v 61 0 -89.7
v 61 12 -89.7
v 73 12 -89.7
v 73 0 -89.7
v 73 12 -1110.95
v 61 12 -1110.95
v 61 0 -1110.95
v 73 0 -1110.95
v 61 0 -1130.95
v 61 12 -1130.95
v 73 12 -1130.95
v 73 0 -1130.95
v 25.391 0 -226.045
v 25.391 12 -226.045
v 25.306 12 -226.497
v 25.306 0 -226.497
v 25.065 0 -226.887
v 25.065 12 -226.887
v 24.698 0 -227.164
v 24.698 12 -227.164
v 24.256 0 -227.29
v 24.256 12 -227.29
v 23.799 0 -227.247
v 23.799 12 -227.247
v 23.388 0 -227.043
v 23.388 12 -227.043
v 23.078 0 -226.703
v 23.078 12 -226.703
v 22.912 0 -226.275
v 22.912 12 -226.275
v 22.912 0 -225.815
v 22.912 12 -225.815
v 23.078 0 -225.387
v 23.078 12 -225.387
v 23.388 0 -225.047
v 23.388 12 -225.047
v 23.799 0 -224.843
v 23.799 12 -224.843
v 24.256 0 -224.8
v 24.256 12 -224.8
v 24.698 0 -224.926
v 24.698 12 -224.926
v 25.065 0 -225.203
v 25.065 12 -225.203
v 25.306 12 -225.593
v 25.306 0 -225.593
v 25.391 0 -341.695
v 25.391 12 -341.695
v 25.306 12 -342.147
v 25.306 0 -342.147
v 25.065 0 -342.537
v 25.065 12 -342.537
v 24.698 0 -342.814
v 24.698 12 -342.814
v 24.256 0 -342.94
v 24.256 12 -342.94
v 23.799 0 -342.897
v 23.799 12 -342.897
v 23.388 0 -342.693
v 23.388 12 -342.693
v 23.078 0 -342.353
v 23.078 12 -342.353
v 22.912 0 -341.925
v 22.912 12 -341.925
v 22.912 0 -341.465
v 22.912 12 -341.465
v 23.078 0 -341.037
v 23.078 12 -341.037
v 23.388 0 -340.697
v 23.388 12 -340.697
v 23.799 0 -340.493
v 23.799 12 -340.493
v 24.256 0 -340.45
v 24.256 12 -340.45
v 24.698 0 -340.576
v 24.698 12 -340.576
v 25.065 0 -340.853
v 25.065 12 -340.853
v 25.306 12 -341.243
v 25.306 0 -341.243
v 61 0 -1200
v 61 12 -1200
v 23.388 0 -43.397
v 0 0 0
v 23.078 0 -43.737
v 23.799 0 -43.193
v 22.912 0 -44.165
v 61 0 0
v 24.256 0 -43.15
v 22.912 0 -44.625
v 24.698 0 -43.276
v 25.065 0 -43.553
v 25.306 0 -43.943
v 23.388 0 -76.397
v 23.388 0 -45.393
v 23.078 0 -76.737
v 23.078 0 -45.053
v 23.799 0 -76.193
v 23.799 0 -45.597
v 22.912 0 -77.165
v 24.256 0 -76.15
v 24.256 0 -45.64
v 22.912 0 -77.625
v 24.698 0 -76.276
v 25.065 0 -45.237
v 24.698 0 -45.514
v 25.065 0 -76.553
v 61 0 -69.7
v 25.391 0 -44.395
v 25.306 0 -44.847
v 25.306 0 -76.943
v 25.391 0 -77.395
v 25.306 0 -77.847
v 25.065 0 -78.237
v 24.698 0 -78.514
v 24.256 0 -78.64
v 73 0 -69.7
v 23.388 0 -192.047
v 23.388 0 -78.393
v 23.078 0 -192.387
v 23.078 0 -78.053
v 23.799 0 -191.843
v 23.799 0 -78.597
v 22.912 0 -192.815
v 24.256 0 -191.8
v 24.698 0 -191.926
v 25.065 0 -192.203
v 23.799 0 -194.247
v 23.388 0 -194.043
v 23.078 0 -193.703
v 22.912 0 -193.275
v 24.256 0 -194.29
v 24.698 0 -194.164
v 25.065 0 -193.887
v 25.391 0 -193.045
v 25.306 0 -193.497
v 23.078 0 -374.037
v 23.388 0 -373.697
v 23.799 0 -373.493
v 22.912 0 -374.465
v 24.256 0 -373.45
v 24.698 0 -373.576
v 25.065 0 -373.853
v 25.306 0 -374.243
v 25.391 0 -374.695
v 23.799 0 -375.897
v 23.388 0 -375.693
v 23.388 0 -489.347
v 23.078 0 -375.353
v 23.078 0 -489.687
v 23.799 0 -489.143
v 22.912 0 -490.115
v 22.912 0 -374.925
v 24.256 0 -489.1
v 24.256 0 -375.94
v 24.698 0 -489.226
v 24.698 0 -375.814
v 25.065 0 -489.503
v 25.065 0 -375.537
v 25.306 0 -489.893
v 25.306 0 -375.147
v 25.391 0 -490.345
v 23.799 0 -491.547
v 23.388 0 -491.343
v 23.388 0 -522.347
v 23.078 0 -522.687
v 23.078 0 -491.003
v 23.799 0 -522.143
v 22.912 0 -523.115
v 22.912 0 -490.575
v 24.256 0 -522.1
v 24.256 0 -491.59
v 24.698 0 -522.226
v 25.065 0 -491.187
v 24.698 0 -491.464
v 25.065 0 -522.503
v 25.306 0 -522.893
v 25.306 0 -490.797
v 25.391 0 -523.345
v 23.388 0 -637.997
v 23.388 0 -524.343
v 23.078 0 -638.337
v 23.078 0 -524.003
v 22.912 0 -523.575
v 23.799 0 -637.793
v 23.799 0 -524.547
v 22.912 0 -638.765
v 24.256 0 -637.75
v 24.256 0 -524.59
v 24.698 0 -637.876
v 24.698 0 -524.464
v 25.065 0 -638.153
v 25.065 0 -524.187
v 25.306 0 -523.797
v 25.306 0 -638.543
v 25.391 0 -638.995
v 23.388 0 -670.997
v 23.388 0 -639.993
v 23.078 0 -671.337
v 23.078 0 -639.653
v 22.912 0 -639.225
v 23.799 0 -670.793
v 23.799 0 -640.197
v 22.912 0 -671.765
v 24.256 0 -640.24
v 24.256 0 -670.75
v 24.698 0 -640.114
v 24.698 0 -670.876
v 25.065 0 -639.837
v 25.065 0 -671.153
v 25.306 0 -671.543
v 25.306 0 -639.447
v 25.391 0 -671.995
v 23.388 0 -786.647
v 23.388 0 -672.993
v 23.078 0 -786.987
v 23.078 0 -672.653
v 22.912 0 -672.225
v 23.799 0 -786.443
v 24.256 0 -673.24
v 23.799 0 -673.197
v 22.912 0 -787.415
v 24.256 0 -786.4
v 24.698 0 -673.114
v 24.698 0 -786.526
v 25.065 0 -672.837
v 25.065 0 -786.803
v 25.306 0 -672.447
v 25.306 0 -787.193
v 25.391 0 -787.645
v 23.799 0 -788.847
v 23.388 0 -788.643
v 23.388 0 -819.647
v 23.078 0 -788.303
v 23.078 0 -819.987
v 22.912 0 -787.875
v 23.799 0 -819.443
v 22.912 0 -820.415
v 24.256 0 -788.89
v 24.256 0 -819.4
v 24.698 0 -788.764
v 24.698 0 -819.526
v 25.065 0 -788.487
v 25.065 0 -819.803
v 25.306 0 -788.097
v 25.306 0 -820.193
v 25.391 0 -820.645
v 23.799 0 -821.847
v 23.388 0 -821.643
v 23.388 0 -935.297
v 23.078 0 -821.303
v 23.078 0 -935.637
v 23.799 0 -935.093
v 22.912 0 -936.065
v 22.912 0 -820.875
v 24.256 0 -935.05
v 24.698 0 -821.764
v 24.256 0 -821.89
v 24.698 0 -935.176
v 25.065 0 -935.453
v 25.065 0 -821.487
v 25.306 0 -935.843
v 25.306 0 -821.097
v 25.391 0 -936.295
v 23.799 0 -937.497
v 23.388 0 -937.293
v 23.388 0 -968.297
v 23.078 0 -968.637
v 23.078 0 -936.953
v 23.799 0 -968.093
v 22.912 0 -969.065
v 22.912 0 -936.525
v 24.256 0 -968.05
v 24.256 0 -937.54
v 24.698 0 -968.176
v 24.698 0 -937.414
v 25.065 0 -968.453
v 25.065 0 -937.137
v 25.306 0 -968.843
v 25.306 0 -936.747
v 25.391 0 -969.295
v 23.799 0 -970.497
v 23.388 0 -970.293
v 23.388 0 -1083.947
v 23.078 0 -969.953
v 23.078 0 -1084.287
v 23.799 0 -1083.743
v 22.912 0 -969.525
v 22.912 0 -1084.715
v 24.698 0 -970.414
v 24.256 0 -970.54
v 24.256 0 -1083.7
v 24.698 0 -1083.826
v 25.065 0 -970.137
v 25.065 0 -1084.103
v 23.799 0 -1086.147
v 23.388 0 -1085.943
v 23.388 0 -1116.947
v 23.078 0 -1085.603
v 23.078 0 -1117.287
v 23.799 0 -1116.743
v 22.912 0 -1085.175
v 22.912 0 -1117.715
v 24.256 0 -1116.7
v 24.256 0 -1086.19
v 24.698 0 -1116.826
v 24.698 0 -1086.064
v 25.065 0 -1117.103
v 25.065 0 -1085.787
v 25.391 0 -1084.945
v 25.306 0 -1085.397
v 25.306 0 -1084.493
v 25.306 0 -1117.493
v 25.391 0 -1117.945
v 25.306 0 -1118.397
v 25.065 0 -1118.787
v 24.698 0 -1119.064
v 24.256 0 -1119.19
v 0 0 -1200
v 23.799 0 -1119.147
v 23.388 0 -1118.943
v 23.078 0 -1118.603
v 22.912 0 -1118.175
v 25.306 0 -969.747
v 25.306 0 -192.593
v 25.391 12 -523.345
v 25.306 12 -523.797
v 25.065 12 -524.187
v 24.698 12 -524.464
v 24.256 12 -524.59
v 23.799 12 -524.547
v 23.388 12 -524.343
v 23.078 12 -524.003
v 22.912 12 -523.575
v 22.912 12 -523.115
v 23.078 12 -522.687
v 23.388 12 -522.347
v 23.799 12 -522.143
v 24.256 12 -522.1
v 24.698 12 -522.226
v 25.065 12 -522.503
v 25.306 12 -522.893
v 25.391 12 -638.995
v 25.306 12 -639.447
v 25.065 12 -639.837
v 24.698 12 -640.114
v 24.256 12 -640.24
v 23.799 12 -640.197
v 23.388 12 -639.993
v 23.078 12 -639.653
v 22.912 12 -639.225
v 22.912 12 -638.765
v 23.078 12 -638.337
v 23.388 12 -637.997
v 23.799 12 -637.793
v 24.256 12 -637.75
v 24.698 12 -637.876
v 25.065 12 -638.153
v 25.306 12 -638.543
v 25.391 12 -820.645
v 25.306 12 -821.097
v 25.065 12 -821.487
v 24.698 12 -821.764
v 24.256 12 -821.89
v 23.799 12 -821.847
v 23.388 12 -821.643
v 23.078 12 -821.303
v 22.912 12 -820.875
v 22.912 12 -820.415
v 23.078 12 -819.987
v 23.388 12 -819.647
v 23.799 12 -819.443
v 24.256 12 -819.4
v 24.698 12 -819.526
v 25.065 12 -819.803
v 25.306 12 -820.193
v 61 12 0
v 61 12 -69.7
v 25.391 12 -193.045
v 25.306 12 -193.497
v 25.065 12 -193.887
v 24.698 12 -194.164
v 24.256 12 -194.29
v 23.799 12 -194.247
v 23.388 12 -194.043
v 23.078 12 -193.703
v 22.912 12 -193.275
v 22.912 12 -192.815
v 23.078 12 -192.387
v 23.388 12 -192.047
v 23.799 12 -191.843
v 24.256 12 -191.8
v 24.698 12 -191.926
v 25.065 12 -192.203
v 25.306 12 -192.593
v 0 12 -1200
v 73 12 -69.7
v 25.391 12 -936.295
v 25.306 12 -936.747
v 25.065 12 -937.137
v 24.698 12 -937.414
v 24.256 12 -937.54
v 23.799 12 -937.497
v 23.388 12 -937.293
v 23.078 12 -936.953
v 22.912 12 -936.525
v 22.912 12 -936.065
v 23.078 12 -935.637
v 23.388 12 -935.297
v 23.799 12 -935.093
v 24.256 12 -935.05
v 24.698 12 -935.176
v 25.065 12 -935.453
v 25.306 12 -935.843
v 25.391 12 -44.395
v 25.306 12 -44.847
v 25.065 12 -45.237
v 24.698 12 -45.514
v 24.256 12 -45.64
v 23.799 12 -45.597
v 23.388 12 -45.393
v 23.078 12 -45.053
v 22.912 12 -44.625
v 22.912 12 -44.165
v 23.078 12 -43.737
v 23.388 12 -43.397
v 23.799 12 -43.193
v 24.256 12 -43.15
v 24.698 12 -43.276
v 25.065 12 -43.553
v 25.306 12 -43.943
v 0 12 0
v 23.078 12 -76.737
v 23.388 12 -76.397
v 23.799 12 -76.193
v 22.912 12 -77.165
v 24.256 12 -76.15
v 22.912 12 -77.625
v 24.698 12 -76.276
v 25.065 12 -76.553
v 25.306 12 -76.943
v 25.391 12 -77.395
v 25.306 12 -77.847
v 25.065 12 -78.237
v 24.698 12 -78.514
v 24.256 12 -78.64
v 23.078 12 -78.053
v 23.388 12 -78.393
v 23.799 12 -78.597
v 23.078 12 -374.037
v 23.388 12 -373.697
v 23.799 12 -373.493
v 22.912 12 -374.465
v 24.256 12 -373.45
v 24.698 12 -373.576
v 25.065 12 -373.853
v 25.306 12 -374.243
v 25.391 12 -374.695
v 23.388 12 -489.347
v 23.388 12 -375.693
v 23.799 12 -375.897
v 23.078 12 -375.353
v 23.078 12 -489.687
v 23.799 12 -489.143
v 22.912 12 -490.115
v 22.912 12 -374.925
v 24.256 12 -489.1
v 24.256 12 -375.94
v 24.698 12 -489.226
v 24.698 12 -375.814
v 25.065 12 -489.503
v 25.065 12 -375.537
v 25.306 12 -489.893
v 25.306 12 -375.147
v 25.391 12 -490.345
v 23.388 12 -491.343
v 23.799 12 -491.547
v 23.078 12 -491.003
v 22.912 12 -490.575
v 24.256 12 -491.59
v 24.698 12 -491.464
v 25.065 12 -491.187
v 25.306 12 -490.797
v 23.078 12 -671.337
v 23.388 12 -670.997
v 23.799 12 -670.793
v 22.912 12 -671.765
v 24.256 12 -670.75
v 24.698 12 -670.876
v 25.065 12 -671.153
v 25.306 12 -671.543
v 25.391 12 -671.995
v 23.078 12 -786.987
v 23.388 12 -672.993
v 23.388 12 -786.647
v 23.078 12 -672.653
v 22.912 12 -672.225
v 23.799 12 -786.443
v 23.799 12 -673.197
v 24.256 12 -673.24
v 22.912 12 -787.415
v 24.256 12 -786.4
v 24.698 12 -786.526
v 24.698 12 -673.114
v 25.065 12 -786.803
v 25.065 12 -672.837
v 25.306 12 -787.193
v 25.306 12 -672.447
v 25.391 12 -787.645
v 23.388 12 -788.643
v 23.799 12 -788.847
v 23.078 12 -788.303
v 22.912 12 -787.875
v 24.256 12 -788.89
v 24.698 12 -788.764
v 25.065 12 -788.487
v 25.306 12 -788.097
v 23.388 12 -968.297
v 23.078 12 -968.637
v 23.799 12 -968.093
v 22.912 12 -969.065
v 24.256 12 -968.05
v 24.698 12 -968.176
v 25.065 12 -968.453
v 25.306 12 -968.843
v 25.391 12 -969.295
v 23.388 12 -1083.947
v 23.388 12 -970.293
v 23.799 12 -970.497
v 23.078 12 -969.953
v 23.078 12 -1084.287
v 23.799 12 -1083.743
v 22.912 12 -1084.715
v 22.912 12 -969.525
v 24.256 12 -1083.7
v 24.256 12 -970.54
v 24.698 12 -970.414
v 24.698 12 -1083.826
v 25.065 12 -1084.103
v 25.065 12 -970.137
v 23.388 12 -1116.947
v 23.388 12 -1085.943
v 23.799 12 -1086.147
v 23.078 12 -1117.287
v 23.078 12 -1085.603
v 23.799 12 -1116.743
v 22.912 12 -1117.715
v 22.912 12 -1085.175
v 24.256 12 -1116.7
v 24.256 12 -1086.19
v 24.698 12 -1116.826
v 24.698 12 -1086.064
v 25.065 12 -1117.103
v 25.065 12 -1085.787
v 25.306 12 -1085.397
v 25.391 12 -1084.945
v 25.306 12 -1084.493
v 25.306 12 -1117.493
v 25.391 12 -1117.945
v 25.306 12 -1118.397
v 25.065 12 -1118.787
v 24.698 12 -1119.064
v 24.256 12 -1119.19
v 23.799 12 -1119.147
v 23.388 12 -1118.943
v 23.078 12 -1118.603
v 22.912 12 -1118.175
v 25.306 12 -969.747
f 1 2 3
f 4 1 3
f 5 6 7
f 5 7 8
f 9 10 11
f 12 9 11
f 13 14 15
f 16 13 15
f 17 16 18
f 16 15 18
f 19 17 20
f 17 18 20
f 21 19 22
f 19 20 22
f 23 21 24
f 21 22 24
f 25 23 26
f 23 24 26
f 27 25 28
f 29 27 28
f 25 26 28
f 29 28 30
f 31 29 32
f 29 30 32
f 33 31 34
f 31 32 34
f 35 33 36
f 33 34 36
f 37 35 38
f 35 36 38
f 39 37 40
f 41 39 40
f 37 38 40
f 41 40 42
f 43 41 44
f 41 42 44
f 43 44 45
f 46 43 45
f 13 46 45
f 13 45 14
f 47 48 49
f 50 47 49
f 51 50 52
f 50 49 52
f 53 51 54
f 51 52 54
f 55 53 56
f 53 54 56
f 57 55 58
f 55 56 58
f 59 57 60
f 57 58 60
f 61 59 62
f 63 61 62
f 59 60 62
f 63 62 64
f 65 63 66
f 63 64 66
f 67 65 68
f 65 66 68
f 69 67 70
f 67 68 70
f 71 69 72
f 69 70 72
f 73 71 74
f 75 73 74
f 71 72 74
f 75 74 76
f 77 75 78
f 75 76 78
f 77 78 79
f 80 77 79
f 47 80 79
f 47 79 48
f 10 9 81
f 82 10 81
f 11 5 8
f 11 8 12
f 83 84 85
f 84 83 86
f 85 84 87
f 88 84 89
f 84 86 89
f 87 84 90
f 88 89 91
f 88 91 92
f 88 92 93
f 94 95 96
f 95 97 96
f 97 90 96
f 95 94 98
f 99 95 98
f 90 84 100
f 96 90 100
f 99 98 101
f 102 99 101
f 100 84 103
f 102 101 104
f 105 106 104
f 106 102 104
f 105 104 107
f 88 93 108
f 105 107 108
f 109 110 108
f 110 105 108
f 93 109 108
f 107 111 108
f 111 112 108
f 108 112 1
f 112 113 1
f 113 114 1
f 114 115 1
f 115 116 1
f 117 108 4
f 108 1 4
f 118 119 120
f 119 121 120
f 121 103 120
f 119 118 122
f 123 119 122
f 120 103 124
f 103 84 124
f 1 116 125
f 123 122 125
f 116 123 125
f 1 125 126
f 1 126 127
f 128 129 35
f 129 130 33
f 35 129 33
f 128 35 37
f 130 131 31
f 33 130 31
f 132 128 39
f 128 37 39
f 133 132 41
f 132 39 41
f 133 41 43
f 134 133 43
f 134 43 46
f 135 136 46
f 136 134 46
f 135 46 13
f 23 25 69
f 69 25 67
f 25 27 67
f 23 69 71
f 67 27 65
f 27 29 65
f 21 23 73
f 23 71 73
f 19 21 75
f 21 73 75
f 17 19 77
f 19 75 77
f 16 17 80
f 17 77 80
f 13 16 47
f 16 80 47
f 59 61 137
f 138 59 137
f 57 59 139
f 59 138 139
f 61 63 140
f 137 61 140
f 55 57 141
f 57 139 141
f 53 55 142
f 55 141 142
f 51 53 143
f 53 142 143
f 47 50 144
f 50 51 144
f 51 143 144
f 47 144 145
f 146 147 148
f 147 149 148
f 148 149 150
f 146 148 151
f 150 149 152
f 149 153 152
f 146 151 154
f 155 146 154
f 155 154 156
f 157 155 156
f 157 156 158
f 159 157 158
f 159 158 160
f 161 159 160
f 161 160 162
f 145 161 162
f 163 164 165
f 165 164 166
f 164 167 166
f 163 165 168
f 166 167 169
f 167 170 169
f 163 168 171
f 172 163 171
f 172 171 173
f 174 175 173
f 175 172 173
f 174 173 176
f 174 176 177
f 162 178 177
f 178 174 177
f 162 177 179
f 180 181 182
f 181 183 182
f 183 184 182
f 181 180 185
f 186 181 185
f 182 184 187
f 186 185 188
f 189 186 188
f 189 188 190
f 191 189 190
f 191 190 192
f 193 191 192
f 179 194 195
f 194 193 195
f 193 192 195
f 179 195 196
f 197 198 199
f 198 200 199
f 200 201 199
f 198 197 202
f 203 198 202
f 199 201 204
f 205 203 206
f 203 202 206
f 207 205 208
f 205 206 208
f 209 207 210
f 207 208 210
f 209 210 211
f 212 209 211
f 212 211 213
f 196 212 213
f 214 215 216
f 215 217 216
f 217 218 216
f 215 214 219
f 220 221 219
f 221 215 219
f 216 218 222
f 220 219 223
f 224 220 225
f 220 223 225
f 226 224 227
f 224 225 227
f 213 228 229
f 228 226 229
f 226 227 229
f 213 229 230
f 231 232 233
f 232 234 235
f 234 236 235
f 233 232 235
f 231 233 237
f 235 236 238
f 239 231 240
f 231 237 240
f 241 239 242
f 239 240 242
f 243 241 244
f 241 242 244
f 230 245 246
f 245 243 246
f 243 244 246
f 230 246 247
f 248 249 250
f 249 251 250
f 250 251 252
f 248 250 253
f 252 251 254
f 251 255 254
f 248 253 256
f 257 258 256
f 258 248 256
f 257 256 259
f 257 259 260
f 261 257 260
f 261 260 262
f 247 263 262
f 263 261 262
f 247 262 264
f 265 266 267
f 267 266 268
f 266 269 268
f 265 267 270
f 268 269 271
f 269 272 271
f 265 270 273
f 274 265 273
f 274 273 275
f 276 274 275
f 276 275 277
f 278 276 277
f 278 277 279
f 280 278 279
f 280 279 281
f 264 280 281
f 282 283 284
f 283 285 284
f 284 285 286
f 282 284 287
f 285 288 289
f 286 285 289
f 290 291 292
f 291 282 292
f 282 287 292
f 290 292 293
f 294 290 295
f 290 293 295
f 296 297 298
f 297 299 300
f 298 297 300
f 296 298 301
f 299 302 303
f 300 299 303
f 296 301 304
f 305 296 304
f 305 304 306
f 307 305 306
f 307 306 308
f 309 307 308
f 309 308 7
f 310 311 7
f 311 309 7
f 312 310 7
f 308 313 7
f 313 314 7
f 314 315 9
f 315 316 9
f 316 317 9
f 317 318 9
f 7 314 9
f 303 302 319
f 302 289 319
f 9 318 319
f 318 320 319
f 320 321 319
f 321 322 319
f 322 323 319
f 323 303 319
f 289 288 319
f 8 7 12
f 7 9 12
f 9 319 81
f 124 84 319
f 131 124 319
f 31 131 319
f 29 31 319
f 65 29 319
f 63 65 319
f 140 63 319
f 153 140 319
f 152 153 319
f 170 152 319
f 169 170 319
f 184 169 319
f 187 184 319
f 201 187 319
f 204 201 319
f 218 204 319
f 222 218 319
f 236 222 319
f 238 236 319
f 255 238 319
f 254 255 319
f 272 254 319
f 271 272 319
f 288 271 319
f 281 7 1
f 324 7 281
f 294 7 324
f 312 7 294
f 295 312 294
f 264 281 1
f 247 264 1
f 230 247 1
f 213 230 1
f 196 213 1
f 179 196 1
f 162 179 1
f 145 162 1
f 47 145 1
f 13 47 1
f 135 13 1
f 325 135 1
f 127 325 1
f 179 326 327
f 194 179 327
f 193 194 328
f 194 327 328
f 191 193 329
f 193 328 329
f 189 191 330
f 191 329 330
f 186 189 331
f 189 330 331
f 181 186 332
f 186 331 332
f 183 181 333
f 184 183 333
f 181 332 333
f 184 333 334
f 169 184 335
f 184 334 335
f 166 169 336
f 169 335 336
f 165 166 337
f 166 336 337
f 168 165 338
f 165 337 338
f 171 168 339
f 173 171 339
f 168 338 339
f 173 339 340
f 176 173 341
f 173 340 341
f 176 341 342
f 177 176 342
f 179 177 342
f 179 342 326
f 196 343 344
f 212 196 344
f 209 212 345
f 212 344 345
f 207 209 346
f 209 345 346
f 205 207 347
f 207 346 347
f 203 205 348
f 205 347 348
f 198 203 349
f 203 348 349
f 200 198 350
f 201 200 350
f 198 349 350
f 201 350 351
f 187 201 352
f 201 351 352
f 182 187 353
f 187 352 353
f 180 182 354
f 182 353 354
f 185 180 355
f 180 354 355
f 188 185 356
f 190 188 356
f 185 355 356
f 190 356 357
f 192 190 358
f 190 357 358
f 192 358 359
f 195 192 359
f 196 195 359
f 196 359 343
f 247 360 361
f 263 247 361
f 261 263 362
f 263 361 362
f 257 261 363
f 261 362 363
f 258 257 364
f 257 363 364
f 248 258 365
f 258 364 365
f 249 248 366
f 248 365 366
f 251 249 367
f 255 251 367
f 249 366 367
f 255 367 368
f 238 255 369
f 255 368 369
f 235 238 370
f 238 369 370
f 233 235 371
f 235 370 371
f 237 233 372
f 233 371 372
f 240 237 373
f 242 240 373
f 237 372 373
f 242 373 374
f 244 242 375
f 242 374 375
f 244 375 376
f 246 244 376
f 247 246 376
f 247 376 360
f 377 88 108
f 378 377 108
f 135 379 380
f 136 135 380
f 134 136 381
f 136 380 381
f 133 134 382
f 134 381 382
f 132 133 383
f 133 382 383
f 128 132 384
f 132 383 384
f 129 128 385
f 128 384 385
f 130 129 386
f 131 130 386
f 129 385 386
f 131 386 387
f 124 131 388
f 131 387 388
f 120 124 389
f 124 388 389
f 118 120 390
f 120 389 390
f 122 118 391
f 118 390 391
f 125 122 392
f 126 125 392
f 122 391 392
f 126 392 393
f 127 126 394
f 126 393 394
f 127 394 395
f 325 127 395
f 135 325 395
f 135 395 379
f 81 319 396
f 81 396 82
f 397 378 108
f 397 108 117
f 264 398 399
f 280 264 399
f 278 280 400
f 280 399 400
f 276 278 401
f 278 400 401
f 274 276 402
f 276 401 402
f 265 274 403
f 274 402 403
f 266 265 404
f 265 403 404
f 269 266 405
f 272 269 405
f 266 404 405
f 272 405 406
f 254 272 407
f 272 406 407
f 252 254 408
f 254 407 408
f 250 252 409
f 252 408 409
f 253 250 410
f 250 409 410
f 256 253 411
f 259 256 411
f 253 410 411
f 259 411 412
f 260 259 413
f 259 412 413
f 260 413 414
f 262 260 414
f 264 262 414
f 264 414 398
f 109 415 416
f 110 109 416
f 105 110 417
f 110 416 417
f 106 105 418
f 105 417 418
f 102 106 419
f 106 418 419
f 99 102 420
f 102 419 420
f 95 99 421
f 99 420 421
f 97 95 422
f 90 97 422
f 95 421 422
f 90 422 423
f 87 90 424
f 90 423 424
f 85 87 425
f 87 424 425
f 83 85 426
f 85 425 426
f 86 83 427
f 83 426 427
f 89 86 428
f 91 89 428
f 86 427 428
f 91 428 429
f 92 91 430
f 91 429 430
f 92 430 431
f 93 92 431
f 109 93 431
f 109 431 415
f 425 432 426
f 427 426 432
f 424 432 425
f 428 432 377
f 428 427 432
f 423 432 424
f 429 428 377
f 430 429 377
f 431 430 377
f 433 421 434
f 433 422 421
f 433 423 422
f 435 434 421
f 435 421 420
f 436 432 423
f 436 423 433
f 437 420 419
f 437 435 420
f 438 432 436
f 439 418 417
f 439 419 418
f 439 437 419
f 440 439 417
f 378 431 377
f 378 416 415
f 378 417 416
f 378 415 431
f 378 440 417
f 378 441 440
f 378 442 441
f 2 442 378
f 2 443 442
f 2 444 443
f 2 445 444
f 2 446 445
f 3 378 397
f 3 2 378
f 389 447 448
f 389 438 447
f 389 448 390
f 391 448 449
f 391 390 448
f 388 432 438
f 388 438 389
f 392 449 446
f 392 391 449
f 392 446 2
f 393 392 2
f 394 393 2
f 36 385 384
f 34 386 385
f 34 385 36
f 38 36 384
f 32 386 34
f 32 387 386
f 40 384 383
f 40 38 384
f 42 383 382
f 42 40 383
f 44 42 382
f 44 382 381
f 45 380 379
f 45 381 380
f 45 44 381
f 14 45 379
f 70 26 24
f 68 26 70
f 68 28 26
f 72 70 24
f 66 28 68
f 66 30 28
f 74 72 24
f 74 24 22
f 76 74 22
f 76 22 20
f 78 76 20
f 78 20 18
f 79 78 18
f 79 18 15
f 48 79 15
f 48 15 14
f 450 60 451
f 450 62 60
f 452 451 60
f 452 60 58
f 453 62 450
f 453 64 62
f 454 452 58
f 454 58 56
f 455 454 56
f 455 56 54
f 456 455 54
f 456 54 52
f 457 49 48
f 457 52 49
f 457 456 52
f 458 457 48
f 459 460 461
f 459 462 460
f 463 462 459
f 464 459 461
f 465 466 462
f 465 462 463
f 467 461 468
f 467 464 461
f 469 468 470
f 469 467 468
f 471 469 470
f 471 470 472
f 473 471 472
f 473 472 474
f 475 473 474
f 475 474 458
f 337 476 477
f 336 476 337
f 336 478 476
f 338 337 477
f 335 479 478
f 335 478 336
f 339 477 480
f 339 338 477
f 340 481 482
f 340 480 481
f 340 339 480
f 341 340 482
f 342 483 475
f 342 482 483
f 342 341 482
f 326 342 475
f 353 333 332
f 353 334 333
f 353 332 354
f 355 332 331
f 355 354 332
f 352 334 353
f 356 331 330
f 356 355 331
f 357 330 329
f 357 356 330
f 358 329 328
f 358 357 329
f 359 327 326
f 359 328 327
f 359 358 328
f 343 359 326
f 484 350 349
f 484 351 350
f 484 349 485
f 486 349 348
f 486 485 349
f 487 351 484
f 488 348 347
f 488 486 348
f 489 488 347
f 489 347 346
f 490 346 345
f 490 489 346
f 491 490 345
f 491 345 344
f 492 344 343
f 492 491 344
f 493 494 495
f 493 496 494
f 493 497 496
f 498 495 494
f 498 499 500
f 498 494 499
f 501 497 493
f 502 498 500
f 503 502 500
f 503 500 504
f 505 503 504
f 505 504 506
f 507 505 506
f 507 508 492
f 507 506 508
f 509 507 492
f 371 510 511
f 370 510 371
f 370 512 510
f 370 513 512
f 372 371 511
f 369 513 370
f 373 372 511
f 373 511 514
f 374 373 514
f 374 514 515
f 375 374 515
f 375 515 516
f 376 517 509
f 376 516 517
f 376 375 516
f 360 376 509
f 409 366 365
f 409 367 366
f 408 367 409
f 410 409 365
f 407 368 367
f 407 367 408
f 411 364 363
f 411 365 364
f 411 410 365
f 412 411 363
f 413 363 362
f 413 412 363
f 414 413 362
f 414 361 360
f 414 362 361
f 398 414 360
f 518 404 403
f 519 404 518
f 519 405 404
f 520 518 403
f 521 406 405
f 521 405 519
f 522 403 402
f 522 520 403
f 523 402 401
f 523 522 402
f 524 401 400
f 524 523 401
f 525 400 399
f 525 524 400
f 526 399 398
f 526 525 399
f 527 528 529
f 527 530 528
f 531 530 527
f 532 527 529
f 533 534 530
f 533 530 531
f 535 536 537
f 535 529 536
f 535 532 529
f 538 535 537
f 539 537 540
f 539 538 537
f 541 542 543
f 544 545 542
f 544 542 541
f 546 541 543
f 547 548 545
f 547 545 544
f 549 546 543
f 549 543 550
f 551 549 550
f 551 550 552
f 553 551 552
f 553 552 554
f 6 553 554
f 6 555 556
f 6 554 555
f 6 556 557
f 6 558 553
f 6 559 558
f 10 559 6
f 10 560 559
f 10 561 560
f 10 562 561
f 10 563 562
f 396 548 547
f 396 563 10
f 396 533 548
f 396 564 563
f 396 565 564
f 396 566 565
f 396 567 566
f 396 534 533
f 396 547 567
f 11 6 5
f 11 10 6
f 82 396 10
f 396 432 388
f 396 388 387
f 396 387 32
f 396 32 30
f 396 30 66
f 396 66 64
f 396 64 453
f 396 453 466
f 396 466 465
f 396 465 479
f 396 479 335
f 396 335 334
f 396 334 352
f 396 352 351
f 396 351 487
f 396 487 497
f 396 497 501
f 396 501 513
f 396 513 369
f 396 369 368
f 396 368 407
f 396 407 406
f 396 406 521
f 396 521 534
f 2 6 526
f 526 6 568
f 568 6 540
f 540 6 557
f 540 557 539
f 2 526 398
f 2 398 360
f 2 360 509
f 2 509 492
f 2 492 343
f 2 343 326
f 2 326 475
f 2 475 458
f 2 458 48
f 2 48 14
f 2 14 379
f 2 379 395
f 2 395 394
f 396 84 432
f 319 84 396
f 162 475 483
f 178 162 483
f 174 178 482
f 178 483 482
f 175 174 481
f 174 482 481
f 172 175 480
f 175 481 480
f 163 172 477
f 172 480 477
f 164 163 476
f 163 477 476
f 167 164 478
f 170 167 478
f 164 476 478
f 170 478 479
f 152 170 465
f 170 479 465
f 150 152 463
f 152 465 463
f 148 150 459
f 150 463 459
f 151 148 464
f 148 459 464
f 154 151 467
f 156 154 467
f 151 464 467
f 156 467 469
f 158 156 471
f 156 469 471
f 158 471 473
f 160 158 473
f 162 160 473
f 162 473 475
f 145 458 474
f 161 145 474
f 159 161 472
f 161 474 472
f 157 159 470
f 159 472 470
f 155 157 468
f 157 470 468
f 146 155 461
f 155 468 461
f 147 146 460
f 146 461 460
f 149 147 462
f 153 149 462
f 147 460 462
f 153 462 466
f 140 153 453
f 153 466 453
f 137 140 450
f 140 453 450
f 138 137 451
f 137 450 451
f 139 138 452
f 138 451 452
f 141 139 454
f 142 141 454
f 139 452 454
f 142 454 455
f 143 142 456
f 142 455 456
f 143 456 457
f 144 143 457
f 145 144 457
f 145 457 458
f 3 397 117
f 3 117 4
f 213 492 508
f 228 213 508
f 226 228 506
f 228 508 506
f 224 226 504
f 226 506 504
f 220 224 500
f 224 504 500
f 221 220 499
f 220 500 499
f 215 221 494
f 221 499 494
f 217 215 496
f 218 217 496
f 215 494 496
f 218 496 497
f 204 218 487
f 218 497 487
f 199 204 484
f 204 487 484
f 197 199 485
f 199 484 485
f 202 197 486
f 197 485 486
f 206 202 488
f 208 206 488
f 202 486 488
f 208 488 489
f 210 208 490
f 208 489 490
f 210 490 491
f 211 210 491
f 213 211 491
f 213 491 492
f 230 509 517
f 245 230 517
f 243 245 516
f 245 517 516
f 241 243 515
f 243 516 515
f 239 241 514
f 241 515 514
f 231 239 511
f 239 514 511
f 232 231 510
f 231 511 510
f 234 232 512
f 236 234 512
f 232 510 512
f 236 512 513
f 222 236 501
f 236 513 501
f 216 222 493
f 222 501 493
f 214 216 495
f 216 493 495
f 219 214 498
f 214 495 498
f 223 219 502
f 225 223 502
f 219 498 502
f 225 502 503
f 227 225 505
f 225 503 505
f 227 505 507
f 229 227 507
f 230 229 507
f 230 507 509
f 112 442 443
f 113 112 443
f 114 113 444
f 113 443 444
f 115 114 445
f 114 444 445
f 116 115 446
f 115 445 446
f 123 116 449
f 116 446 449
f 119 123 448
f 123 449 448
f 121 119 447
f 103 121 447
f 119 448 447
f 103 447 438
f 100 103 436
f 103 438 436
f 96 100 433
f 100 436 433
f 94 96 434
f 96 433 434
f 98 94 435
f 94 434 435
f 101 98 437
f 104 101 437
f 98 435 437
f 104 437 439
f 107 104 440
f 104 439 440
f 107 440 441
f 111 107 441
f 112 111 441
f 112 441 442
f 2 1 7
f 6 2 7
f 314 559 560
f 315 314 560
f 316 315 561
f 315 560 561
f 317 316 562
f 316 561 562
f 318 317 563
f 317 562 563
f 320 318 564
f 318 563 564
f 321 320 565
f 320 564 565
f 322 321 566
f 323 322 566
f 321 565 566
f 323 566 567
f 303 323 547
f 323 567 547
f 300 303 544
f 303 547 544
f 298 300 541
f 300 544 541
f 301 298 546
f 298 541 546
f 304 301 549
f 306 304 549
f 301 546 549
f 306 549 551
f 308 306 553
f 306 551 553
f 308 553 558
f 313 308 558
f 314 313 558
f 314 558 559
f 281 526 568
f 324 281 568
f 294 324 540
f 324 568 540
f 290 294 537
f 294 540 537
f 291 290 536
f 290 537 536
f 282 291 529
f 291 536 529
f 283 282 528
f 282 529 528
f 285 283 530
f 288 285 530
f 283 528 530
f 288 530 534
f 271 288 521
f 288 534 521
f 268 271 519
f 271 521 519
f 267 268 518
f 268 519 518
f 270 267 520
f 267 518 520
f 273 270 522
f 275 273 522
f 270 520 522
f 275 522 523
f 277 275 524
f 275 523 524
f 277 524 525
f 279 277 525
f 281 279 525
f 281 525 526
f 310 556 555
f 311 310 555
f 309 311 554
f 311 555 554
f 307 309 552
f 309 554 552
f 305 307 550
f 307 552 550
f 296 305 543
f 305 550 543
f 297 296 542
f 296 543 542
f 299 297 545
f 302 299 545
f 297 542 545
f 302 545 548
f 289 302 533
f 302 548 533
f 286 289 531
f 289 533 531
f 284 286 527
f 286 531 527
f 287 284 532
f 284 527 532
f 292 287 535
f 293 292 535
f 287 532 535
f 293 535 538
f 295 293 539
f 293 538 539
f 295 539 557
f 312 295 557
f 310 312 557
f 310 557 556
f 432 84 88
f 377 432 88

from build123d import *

# Parameters (mm, degrees)
SKETCH1_W           = 61
SKETCH1_H           = 1200
BOSS_EXTRUDE1_DEPTH = 12
SKETCH2_R           = 1.25
CUT_EXTRUDE1_DEPTH  = 20
SKETCH3_W           = 23.420452048
SKETCH3_H           = 20
BOSS_EXTRUDE2_DEPTH = 12


with BuildPart() as part:
    # Sketch1 → Boss-Extrude1 (new body)
    with BuildSketch(Plane(origin=(0, 0, 0), x_dir=(1, 0, 0), z_dir=(0, 1, 0))):
        with Locations((30.5, 600)):
            Rectangle(SKETCH1_W, SKETCH1_H)
    extrude(amount=BOSS_EXTRUDE1_DEPTH)

    # Sketch2 → Cut-Extrude1 (cut)
    with BuildSketch(Plane(origin=(0, 12, 0), x_dir=(1, 0, 0), z_dir=(0, 1, 0))):
        with Locations((24.140899916, 77.395)):
            Circle(SKETCH2_R)
        with Locations((24.140899916, 44.395)):
            Circle(SKETCH2_R)
        with Locations((24.140899916, 226.045)):
            Circle(SKETCH2_R)
        with Locations((24.140899916, 193.045)):
            Circle(SKETCH2_R)
        with Locations((24.140899916, 374.695)):
            Circle(SKETCH2_R)
        with Locations((24.140899916, 341.695)):
            Circle(SKETCH2_R)
        with Locations((24.140899916, 523.345)):
            Circle(SKETCH2_R)
        with Locations((24.140899916, 490.345)):
            Circle(SKETCH2_R)
        with Locations((24.140899916, 671.995)):
            Circle(SKETCH2_R)
        with Locations((24.140899916, 638.995)):
            Circle(SKETCH2_R)
        with Locations((24.140899916, 820.645)):
            Circle(SKETCH2_R)
        with Locations((24.140899916, 787.645)):
            Circle(SKETCH2_R)
        with Locations((24.140899916, 969.295)):
            Circle(SKETCH2_R)
        with Locations((24.140899916, 936.295)):
            Circle(SKETCH2_R)
        with Locations((24.140899916, 1117.945)):
            Circle(SKETCH2_R)
        with Locations((24.140899916, 1084.945)):
            Circle(SKETCH2_R)
    extrude(amount=-CUT_EXTRUDE1_DEPTH, mode=Mode.SUBTRACT)

    # Sketch3 → Boss-Extrude2 (add)
    with BuildSketch(Plane(origin=(0, 12, 0), x_dir=(1, 0, 0), z_dir=(0, 1, 0))):
        with Locations((61.289773976, 79.7)):
            Rectangle(SKETCH3_W, SKETCH3_H)
        with Locations((61.289773976, 1120.95)):
            Rectangle(SKETCH3_W, SKETCH3_H)
    extrude(amount=-BOSS_EXTRUDE2_DEPTH)


solid = part.part
